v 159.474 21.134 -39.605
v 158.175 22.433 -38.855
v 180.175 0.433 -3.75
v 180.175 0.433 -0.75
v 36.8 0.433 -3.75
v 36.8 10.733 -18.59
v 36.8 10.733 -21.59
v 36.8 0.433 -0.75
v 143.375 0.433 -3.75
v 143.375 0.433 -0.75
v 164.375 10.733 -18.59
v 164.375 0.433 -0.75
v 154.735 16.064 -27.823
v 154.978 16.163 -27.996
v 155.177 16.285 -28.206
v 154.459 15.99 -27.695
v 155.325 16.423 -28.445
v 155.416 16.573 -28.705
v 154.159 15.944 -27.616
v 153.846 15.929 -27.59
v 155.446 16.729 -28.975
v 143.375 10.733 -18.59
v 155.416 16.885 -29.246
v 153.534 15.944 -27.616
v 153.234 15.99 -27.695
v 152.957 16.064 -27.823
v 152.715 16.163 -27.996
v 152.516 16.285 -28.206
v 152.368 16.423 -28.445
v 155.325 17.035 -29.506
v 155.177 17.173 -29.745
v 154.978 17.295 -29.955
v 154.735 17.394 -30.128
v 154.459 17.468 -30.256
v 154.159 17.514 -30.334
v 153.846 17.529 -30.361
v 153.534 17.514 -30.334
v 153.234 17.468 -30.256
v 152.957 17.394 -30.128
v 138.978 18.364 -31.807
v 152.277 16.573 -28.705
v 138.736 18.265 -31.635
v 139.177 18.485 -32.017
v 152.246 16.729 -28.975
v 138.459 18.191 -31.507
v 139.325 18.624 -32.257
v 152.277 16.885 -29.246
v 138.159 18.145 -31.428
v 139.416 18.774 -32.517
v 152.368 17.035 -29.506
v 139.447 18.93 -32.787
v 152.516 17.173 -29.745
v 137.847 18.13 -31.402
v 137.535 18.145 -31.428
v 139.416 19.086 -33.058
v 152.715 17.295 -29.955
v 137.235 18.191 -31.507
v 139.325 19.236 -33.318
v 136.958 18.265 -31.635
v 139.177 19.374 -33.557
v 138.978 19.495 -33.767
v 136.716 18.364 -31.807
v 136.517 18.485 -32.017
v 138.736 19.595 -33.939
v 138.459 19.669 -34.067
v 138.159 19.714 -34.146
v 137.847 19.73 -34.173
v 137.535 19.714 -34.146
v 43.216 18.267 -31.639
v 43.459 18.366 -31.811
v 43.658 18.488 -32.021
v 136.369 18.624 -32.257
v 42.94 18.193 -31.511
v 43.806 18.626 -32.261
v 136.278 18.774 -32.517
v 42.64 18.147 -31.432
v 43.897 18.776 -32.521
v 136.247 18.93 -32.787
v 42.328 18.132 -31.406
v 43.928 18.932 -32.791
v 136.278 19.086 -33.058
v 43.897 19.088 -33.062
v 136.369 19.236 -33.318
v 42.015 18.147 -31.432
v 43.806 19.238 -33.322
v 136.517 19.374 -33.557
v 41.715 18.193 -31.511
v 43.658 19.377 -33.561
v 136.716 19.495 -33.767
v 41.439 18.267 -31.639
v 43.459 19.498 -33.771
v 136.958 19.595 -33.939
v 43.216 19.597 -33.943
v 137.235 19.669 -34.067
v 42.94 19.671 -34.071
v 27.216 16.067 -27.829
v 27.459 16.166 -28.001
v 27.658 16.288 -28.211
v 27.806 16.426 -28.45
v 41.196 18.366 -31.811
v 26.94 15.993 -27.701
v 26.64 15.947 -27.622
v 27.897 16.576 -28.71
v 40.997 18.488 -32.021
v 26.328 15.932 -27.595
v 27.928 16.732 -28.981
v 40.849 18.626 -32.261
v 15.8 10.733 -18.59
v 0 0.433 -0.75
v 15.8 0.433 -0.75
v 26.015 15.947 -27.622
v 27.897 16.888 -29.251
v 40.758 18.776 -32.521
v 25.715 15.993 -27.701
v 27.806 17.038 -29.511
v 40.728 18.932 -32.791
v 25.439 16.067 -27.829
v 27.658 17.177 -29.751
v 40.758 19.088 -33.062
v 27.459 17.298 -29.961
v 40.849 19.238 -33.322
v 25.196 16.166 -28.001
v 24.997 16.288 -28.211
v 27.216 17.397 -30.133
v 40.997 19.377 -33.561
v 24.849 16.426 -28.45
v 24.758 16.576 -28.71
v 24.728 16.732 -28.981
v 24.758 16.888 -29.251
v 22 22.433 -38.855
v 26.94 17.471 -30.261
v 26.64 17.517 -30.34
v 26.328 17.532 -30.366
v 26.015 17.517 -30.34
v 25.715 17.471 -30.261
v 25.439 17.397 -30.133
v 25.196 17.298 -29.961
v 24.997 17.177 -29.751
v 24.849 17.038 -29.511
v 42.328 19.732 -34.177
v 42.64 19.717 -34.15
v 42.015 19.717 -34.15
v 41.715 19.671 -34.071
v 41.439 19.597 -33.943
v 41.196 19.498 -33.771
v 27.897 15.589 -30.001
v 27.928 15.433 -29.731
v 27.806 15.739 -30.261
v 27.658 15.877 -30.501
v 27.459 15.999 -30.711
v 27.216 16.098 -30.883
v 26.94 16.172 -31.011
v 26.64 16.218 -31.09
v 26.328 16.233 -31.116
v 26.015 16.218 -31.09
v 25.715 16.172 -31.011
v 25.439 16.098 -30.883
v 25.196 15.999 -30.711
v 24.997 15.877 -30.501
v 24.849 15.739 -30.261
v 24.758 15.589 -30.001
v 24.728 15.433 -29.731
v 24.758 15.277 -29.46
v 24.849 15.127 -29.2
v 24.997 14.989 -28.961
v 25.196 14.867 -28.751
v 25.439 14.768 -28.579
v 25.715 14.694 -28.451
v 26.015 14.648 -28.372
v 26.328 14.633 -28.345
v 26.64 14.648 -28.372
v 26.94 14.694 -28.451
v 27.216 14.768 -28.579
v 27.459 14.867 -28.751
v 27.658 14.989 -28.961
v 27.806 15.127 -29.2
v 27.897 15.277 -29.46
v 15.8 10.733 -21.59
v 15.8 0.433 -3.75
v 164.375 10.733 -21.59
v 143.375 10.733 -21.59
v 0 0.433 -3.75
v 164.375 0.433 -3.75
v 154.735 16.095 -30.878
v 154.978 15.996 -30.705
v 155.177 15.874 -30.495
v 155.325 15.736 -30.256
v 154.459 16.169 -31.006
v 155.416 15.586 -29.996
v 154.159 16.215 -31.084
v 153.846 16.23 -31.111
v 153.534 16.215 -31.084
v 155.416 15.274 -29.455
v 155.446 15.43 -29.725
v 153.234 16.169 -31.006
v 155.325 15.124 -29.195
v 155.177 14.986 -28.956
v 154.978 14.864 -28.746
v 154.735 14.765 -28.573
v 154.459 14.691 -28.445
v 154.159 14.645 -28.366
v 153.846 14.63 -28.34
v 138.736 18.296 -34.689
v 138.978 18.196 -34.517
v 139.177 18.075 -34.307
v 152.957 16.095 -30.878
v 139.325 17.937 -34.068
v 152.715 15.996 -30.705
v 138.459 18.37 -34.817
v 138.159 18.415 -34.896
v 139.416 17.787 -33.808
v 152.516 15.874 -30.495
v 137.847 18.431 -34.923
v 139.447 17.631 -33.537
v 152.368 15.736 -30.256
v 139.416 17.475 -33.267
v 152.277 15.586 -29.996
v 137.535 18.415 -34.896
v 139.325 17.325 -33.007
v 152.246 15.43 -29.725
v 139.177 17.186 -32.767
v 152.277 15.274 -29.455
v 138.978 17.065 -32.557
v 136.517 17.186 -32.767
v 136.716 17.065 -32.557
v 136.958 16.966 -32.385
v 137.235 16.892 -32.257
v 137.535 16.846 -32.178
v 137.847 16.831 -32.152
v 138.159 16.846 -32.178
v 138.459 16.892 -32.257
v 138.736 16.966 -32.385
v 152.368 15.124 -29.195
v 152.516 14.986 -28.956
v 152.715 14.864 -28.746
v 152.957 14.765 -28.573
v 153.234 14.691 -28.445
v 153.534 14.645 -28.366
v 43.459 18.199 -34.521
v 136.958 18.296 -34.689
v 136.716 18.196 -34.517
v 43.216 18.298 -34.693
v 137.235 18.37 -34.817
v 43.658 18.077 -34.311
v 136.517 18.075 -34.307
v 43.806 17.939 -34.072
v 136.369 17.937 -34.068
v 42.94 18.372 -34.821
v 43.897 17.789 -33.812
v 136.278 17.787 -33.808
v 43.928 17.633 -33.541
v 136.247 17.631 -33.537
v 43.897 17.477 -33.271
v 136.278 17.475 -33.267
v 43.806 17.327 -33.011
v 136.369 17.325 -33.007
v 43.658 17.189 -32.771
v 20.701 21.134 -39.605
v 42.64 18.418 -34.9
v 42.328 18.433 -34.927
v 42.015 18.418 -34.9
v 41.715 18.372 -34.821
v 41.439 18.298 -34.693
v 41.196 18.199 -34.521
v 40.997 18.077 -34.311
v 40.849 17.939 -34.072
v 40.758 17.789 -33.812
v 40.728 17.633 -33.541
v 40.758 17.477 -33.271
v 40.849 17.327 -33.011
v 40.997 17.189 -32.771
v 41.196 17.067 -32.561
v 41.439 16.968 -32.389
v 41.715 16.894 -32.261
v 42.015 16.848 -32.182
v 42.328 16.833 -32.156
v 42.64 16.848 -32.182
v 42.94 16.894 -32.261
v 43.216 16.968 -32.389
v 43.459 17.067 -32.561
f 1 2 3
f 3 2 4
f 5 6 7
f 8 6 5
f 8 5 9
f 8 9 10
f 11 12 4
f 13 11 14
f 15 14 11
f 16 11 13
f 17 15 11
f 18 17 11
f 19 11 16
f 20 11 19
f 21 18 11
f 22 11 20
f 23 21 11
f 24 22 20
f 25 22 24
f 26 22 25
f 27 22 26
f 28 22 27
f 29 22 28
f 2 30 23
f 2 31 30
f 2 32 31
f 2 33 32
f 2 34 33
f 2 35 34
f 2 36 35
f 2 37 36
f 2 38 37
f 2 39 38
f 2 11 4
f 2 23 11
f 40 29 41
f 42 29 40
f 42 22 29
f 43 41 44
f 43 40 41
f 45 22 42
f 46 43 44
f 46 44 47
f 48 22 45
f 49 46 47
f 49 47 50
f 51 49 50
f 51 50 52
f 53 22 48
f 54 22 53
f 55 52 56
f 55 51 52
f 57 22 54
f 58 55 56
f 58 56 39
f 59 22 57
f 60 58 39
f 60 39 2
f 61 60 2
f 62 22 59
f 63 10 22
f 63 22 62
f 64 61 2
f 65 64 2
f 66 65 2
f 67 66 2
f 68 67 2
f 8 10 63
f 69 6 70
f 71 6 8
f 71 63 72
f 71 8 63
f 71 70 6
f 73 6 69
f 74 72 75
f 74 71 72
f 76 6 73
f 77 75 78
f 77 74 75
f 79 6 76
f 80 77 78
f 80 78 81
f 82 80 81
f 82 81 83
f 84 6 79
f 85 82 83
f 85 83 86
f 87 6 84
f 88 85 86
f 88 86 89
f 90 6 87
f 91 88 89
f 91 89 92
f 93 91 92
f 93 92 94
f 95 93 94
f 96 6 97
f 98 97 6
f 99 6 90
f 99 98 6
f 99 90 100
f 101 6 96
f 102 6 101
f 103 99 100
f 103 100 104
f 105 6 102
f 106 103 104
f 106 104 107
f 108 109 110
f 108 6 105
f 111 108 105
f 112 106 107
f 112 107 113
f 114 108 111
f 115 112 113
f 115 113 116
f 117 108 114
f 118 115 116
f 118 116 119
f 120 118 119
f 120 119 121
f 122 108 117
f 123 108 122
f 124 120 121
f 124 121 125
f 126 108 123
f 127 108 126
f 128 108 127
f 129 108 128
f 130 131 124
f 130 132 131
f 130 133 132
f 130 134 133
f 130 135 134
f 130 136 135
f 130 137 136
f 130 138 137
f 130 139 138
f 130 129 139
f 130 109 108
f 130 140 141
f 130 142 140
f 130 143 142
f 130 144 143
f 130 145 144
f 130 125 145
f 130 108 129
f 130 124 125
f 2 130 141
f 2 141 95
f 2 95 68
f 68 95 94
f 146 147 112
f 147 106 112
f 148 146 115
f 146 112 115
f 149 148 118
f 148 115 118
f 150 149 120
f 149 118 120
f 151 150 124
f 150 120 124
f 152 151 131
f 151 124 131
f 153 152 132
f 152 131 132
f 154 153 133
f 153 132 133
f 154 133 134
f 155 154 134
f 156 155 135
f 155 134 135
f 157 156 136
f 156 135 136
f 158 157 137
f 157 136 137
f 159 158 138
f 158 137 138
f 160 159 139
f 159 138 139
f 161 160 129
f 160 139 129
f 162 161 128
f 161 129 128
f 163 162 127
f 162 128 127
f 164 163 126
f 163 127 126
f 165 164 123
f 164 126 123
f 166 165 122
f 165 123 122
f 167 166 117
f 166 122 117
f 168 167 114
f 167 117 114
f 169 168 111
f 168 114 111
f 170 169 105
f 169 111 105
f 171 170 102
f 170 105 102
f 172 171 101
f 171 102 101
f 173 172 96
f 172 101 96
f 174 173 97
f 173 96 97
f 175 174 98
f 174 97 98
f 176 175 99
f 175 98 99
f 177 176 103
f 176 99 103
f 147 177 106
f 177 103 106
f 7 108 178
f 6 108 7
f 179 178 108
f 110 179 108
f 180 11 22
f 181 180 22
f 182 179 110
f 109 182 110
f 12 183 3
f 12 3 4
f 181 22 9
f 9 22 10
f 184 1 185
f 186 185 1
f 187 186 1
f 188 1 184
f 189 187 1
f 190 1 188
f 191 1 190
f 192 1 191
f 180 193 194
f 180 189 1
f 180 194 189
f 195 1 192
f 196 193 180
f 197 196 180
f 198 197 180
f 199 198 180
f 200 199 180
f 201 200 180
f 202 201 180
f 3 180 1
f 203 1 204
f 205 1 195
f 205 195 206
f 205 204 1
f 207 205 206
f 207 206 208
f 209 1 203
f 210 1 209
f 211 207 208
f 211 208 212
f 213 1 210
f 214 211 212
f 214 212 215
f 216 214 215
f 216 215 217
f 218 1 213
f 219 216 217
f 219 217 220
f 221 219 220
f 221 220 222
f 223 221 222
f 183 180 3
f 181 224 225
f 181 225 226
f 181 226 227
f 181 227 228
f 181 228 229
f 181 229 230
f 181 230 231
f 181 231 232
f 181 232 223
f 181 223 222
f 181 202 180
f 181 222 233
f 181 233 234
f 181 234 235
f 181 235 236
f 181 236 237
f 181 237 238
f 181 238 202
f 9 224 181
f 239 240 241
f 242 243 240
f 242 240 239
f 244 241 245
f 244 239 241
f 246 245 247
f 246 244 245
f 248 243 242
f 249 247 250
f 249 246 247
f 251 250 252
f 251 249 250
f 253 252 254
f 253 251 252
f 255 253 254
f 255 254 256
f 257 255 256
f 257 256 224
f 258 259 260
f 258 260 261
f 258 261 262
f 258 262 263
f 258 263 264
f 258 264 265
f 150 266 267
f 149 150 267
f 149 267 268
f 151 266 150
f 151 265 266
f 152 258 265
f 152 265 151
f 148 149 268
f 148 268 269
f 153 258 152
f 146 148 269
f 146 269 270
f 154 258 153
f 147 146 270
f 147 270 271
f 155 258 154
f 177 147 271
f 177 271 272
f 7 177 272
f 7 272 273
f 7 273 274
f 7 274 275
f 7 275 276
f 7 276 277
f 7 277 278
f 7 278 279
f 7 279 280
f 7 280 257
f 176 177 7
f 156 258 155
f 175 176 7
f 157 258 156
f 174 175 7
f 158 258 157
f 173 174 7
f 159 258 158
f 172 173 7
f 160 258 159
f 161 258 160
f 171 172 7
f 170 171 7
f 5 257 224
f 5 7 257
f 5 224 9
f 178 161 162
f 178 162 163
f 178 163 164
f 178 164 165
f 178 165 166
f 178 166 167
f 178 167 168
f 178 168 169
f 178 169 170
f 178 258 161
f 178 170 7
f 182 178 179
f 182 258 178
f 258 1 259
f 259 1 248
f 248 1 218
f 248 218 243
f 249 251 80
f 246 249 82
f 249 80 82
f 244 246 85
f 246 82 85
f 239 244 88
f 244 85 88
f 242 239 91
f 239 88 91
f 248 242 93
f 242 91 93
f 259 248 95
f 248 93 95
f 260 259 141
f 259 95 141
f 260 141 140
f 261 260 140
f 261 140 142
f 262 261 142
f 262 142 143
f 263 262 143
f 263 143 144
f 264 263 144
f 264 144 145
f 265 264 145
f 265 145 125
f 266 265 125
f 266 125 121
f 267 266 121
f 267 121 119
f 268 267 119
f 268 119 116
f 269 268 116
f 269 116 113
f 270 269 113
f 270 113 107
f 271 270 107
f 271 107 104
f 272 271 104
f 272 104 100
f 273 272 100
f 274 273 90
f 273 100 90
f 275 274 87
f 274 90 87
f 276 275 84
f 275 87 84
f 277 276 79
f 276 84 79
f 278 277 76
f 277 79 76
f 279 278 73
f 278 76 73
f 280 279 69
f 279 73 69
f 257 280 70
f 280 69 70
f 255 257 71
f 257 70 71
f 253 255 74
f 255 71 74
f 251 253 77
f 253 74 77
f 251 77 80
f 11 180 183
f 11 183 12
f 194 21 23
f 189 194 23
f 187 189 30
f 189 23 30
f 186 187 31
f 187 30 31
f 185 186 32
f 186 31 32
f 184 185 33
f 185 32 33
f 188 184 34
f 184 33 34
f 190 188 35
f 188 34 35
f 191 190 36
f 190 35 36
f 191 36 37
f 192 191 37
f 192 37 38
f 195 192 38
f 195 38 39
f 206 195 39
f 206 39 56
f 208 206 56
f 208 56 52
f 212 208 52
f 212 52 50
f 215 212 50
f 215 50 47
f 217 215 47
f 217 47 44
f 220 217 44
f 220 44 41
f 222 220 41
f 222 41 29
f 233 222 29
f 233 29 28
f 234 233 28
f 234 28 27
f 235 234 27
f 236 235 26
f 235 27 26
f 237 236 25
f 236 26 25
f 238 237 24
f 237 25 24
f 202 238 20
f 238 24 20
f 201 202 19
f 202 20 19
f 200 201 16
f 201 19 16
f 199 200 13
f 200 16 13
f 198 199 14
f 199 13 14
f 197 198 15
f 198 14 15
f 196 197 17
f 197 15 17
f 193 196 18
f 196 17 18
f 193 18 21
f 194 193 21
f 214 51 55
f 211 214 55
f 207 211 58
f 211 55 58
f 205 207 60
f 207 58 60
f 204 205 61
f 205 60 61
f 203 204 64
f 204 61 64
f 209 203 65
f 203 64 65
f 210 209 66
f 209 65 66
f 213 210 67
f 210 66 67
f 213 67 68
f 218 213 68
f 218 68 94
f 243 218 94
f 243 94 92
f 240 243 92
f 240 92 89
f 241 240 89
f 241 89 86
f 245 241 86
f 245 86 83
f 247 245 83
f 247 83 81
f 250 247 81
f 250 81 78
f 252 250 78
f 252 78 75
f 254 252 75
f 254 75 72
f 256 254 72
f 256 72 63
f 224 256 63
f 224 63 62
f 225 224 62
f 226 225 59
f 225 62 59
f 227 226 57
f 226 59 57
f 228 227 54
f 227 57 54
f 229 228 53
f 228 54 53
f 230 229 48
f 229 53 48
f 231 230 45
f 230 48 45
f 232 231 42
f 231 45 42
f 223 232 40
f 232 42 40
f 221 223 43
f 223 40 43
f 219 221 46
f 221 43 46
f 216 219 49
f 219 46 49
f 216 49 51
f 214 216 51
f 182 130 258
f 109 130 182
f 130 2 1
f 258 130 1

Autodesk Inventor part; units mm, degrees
ref_plane "YZ Plane" through (0, 0, 0) normal (1, 0, 0) x (0, 1, 0)
ref_plane "XZ Plane" through (0, 0, 0) normal (0, 1, 0) x (-1, 0, 0)
ref_plane "XY Plane" through (0, 0, 0) normal (0, 0, 1) x (1, 0, 0)
sketch "Szkic1" plane through (0, 0, 0) normal (1, 0, 0) x (0, 1, 0)
  line L0 (0.433, -0.75) -> (22.433, -38.8551)
  line L1 (22.433, -38.8551) -> (21.134, -39.6051)
  line L2 (21.134, -39.6051) -> (0.433, -3.75)
  line L3 (0.433, -3.75) -> (0.433, -0.75)
  line L4 (21.134, -39.6051) -> (21.134, -39.6051)
  dimension "d0" = 1.5
  dimension "d1" = 22
  dimension "d2" = 30
extrude "Wyciągnięcie proste1" add sketch "Szkic1" along normal blind 180.175
sketch "Szkic2" plane through (180.175, 22.433, 0) normal (0, 0, -1) x (-1, 0, 0)
  line L0 (143.375, -22) -> (164.375, -22)
  line L1 (164.375, -22) -> (164.375, -11.7)
  line L2 (164.375, -11.7) -> (143.375, -11.7)
  line L3 (143.375, -11.7) -> (143.375, -22)
  line L4 (180.175, -22) -> (0, -22) construction
  line L5 (180.175, -22) -> (180.175, 0) construction
  line L6 (180.175, -22) -> (180.175, 0)
  line L7 (180.175, 0) -> (0, 0) construction
  line L8 (158.175, 0) -> (180.175, -22)
  line L9 (90.0875, -22) -> (90.0875, 0) construction
  line L10 (180.175, 0) -> (158.175, 0)
  line L11 (36.8, -22) -> (15.8, -22)
  line L12 (15.8, -22) -> (15.8, -11.7)
  line L13 (15.8, -11.7) -> (36.8, -11.7)
  line L14 (36.8, -11.7) -> (36.8, -22)
  line L15 (0, -22) -> (0, 0) construction
  line L16 (0, -22) -> (0, 0)
  line L17 (22, 0) -> (0, -22)
  line L18 (0, 0) -> (22, 0)
  dimension "d9" = 21
  dimension "d10" = 10.3
  dimension "d33" = 15.8
  dimension "d34" = 45
extrude "Wyciągnięcie proste2" cut sketch "Szkic2" along normal through all
sketch "Szkic3" plane through (22, 22, -38.1051) normal (0, 0.866, 0.5) x (1, 0, 0)
  line L0 (-2, -0.5359) -> (138.175, -0.5359) construction
  line L1 (-2, -0.5359) -> (4.3275, -0.5359) construction
  line L2 (4.3275, -0.5359) -> (4.3275, -10.5359) construction
  line L3 (-2, -0.5359) -> (20.3275, -0.5359) construction
  line L4 (20.3275, -0.5359) -> (20.3275, -6.1359) construction
  line L5 (0, 0.4641) -> (136.175, 0.4641) construction
  line L6 (68.0875, 0.4641) -> (68.0854, -43.134) construction
  line L7 (-22, -43.134) -> (158.175, -43.134) construction
  circle A0 centre (20.3275, -6.1359) radius 1.6
  circle A1 centre (4.3275, -10.5359) radius 1.6
  circle A2 centre (131.8464, -10.542) radius 1.6
  circle A3 centre (115.8469, -6.1405) radius 1.6
  point P0 (-22, -44)
  point P1 (14.8, -43.134)
  point P2 (121.375, -44)
  dimension "d12" = 6.3275
  dimension "d13" = 10
  dimension "d14" = 22.3275
  dimension "d15" = 5.6
  dimension "d16" = 3.2
  dimension "d17" = 3.2
extrude "Wyciągnięcie proste3" cut sketch "Szkic3" against normal through all
properties part number "Przod2mm"
